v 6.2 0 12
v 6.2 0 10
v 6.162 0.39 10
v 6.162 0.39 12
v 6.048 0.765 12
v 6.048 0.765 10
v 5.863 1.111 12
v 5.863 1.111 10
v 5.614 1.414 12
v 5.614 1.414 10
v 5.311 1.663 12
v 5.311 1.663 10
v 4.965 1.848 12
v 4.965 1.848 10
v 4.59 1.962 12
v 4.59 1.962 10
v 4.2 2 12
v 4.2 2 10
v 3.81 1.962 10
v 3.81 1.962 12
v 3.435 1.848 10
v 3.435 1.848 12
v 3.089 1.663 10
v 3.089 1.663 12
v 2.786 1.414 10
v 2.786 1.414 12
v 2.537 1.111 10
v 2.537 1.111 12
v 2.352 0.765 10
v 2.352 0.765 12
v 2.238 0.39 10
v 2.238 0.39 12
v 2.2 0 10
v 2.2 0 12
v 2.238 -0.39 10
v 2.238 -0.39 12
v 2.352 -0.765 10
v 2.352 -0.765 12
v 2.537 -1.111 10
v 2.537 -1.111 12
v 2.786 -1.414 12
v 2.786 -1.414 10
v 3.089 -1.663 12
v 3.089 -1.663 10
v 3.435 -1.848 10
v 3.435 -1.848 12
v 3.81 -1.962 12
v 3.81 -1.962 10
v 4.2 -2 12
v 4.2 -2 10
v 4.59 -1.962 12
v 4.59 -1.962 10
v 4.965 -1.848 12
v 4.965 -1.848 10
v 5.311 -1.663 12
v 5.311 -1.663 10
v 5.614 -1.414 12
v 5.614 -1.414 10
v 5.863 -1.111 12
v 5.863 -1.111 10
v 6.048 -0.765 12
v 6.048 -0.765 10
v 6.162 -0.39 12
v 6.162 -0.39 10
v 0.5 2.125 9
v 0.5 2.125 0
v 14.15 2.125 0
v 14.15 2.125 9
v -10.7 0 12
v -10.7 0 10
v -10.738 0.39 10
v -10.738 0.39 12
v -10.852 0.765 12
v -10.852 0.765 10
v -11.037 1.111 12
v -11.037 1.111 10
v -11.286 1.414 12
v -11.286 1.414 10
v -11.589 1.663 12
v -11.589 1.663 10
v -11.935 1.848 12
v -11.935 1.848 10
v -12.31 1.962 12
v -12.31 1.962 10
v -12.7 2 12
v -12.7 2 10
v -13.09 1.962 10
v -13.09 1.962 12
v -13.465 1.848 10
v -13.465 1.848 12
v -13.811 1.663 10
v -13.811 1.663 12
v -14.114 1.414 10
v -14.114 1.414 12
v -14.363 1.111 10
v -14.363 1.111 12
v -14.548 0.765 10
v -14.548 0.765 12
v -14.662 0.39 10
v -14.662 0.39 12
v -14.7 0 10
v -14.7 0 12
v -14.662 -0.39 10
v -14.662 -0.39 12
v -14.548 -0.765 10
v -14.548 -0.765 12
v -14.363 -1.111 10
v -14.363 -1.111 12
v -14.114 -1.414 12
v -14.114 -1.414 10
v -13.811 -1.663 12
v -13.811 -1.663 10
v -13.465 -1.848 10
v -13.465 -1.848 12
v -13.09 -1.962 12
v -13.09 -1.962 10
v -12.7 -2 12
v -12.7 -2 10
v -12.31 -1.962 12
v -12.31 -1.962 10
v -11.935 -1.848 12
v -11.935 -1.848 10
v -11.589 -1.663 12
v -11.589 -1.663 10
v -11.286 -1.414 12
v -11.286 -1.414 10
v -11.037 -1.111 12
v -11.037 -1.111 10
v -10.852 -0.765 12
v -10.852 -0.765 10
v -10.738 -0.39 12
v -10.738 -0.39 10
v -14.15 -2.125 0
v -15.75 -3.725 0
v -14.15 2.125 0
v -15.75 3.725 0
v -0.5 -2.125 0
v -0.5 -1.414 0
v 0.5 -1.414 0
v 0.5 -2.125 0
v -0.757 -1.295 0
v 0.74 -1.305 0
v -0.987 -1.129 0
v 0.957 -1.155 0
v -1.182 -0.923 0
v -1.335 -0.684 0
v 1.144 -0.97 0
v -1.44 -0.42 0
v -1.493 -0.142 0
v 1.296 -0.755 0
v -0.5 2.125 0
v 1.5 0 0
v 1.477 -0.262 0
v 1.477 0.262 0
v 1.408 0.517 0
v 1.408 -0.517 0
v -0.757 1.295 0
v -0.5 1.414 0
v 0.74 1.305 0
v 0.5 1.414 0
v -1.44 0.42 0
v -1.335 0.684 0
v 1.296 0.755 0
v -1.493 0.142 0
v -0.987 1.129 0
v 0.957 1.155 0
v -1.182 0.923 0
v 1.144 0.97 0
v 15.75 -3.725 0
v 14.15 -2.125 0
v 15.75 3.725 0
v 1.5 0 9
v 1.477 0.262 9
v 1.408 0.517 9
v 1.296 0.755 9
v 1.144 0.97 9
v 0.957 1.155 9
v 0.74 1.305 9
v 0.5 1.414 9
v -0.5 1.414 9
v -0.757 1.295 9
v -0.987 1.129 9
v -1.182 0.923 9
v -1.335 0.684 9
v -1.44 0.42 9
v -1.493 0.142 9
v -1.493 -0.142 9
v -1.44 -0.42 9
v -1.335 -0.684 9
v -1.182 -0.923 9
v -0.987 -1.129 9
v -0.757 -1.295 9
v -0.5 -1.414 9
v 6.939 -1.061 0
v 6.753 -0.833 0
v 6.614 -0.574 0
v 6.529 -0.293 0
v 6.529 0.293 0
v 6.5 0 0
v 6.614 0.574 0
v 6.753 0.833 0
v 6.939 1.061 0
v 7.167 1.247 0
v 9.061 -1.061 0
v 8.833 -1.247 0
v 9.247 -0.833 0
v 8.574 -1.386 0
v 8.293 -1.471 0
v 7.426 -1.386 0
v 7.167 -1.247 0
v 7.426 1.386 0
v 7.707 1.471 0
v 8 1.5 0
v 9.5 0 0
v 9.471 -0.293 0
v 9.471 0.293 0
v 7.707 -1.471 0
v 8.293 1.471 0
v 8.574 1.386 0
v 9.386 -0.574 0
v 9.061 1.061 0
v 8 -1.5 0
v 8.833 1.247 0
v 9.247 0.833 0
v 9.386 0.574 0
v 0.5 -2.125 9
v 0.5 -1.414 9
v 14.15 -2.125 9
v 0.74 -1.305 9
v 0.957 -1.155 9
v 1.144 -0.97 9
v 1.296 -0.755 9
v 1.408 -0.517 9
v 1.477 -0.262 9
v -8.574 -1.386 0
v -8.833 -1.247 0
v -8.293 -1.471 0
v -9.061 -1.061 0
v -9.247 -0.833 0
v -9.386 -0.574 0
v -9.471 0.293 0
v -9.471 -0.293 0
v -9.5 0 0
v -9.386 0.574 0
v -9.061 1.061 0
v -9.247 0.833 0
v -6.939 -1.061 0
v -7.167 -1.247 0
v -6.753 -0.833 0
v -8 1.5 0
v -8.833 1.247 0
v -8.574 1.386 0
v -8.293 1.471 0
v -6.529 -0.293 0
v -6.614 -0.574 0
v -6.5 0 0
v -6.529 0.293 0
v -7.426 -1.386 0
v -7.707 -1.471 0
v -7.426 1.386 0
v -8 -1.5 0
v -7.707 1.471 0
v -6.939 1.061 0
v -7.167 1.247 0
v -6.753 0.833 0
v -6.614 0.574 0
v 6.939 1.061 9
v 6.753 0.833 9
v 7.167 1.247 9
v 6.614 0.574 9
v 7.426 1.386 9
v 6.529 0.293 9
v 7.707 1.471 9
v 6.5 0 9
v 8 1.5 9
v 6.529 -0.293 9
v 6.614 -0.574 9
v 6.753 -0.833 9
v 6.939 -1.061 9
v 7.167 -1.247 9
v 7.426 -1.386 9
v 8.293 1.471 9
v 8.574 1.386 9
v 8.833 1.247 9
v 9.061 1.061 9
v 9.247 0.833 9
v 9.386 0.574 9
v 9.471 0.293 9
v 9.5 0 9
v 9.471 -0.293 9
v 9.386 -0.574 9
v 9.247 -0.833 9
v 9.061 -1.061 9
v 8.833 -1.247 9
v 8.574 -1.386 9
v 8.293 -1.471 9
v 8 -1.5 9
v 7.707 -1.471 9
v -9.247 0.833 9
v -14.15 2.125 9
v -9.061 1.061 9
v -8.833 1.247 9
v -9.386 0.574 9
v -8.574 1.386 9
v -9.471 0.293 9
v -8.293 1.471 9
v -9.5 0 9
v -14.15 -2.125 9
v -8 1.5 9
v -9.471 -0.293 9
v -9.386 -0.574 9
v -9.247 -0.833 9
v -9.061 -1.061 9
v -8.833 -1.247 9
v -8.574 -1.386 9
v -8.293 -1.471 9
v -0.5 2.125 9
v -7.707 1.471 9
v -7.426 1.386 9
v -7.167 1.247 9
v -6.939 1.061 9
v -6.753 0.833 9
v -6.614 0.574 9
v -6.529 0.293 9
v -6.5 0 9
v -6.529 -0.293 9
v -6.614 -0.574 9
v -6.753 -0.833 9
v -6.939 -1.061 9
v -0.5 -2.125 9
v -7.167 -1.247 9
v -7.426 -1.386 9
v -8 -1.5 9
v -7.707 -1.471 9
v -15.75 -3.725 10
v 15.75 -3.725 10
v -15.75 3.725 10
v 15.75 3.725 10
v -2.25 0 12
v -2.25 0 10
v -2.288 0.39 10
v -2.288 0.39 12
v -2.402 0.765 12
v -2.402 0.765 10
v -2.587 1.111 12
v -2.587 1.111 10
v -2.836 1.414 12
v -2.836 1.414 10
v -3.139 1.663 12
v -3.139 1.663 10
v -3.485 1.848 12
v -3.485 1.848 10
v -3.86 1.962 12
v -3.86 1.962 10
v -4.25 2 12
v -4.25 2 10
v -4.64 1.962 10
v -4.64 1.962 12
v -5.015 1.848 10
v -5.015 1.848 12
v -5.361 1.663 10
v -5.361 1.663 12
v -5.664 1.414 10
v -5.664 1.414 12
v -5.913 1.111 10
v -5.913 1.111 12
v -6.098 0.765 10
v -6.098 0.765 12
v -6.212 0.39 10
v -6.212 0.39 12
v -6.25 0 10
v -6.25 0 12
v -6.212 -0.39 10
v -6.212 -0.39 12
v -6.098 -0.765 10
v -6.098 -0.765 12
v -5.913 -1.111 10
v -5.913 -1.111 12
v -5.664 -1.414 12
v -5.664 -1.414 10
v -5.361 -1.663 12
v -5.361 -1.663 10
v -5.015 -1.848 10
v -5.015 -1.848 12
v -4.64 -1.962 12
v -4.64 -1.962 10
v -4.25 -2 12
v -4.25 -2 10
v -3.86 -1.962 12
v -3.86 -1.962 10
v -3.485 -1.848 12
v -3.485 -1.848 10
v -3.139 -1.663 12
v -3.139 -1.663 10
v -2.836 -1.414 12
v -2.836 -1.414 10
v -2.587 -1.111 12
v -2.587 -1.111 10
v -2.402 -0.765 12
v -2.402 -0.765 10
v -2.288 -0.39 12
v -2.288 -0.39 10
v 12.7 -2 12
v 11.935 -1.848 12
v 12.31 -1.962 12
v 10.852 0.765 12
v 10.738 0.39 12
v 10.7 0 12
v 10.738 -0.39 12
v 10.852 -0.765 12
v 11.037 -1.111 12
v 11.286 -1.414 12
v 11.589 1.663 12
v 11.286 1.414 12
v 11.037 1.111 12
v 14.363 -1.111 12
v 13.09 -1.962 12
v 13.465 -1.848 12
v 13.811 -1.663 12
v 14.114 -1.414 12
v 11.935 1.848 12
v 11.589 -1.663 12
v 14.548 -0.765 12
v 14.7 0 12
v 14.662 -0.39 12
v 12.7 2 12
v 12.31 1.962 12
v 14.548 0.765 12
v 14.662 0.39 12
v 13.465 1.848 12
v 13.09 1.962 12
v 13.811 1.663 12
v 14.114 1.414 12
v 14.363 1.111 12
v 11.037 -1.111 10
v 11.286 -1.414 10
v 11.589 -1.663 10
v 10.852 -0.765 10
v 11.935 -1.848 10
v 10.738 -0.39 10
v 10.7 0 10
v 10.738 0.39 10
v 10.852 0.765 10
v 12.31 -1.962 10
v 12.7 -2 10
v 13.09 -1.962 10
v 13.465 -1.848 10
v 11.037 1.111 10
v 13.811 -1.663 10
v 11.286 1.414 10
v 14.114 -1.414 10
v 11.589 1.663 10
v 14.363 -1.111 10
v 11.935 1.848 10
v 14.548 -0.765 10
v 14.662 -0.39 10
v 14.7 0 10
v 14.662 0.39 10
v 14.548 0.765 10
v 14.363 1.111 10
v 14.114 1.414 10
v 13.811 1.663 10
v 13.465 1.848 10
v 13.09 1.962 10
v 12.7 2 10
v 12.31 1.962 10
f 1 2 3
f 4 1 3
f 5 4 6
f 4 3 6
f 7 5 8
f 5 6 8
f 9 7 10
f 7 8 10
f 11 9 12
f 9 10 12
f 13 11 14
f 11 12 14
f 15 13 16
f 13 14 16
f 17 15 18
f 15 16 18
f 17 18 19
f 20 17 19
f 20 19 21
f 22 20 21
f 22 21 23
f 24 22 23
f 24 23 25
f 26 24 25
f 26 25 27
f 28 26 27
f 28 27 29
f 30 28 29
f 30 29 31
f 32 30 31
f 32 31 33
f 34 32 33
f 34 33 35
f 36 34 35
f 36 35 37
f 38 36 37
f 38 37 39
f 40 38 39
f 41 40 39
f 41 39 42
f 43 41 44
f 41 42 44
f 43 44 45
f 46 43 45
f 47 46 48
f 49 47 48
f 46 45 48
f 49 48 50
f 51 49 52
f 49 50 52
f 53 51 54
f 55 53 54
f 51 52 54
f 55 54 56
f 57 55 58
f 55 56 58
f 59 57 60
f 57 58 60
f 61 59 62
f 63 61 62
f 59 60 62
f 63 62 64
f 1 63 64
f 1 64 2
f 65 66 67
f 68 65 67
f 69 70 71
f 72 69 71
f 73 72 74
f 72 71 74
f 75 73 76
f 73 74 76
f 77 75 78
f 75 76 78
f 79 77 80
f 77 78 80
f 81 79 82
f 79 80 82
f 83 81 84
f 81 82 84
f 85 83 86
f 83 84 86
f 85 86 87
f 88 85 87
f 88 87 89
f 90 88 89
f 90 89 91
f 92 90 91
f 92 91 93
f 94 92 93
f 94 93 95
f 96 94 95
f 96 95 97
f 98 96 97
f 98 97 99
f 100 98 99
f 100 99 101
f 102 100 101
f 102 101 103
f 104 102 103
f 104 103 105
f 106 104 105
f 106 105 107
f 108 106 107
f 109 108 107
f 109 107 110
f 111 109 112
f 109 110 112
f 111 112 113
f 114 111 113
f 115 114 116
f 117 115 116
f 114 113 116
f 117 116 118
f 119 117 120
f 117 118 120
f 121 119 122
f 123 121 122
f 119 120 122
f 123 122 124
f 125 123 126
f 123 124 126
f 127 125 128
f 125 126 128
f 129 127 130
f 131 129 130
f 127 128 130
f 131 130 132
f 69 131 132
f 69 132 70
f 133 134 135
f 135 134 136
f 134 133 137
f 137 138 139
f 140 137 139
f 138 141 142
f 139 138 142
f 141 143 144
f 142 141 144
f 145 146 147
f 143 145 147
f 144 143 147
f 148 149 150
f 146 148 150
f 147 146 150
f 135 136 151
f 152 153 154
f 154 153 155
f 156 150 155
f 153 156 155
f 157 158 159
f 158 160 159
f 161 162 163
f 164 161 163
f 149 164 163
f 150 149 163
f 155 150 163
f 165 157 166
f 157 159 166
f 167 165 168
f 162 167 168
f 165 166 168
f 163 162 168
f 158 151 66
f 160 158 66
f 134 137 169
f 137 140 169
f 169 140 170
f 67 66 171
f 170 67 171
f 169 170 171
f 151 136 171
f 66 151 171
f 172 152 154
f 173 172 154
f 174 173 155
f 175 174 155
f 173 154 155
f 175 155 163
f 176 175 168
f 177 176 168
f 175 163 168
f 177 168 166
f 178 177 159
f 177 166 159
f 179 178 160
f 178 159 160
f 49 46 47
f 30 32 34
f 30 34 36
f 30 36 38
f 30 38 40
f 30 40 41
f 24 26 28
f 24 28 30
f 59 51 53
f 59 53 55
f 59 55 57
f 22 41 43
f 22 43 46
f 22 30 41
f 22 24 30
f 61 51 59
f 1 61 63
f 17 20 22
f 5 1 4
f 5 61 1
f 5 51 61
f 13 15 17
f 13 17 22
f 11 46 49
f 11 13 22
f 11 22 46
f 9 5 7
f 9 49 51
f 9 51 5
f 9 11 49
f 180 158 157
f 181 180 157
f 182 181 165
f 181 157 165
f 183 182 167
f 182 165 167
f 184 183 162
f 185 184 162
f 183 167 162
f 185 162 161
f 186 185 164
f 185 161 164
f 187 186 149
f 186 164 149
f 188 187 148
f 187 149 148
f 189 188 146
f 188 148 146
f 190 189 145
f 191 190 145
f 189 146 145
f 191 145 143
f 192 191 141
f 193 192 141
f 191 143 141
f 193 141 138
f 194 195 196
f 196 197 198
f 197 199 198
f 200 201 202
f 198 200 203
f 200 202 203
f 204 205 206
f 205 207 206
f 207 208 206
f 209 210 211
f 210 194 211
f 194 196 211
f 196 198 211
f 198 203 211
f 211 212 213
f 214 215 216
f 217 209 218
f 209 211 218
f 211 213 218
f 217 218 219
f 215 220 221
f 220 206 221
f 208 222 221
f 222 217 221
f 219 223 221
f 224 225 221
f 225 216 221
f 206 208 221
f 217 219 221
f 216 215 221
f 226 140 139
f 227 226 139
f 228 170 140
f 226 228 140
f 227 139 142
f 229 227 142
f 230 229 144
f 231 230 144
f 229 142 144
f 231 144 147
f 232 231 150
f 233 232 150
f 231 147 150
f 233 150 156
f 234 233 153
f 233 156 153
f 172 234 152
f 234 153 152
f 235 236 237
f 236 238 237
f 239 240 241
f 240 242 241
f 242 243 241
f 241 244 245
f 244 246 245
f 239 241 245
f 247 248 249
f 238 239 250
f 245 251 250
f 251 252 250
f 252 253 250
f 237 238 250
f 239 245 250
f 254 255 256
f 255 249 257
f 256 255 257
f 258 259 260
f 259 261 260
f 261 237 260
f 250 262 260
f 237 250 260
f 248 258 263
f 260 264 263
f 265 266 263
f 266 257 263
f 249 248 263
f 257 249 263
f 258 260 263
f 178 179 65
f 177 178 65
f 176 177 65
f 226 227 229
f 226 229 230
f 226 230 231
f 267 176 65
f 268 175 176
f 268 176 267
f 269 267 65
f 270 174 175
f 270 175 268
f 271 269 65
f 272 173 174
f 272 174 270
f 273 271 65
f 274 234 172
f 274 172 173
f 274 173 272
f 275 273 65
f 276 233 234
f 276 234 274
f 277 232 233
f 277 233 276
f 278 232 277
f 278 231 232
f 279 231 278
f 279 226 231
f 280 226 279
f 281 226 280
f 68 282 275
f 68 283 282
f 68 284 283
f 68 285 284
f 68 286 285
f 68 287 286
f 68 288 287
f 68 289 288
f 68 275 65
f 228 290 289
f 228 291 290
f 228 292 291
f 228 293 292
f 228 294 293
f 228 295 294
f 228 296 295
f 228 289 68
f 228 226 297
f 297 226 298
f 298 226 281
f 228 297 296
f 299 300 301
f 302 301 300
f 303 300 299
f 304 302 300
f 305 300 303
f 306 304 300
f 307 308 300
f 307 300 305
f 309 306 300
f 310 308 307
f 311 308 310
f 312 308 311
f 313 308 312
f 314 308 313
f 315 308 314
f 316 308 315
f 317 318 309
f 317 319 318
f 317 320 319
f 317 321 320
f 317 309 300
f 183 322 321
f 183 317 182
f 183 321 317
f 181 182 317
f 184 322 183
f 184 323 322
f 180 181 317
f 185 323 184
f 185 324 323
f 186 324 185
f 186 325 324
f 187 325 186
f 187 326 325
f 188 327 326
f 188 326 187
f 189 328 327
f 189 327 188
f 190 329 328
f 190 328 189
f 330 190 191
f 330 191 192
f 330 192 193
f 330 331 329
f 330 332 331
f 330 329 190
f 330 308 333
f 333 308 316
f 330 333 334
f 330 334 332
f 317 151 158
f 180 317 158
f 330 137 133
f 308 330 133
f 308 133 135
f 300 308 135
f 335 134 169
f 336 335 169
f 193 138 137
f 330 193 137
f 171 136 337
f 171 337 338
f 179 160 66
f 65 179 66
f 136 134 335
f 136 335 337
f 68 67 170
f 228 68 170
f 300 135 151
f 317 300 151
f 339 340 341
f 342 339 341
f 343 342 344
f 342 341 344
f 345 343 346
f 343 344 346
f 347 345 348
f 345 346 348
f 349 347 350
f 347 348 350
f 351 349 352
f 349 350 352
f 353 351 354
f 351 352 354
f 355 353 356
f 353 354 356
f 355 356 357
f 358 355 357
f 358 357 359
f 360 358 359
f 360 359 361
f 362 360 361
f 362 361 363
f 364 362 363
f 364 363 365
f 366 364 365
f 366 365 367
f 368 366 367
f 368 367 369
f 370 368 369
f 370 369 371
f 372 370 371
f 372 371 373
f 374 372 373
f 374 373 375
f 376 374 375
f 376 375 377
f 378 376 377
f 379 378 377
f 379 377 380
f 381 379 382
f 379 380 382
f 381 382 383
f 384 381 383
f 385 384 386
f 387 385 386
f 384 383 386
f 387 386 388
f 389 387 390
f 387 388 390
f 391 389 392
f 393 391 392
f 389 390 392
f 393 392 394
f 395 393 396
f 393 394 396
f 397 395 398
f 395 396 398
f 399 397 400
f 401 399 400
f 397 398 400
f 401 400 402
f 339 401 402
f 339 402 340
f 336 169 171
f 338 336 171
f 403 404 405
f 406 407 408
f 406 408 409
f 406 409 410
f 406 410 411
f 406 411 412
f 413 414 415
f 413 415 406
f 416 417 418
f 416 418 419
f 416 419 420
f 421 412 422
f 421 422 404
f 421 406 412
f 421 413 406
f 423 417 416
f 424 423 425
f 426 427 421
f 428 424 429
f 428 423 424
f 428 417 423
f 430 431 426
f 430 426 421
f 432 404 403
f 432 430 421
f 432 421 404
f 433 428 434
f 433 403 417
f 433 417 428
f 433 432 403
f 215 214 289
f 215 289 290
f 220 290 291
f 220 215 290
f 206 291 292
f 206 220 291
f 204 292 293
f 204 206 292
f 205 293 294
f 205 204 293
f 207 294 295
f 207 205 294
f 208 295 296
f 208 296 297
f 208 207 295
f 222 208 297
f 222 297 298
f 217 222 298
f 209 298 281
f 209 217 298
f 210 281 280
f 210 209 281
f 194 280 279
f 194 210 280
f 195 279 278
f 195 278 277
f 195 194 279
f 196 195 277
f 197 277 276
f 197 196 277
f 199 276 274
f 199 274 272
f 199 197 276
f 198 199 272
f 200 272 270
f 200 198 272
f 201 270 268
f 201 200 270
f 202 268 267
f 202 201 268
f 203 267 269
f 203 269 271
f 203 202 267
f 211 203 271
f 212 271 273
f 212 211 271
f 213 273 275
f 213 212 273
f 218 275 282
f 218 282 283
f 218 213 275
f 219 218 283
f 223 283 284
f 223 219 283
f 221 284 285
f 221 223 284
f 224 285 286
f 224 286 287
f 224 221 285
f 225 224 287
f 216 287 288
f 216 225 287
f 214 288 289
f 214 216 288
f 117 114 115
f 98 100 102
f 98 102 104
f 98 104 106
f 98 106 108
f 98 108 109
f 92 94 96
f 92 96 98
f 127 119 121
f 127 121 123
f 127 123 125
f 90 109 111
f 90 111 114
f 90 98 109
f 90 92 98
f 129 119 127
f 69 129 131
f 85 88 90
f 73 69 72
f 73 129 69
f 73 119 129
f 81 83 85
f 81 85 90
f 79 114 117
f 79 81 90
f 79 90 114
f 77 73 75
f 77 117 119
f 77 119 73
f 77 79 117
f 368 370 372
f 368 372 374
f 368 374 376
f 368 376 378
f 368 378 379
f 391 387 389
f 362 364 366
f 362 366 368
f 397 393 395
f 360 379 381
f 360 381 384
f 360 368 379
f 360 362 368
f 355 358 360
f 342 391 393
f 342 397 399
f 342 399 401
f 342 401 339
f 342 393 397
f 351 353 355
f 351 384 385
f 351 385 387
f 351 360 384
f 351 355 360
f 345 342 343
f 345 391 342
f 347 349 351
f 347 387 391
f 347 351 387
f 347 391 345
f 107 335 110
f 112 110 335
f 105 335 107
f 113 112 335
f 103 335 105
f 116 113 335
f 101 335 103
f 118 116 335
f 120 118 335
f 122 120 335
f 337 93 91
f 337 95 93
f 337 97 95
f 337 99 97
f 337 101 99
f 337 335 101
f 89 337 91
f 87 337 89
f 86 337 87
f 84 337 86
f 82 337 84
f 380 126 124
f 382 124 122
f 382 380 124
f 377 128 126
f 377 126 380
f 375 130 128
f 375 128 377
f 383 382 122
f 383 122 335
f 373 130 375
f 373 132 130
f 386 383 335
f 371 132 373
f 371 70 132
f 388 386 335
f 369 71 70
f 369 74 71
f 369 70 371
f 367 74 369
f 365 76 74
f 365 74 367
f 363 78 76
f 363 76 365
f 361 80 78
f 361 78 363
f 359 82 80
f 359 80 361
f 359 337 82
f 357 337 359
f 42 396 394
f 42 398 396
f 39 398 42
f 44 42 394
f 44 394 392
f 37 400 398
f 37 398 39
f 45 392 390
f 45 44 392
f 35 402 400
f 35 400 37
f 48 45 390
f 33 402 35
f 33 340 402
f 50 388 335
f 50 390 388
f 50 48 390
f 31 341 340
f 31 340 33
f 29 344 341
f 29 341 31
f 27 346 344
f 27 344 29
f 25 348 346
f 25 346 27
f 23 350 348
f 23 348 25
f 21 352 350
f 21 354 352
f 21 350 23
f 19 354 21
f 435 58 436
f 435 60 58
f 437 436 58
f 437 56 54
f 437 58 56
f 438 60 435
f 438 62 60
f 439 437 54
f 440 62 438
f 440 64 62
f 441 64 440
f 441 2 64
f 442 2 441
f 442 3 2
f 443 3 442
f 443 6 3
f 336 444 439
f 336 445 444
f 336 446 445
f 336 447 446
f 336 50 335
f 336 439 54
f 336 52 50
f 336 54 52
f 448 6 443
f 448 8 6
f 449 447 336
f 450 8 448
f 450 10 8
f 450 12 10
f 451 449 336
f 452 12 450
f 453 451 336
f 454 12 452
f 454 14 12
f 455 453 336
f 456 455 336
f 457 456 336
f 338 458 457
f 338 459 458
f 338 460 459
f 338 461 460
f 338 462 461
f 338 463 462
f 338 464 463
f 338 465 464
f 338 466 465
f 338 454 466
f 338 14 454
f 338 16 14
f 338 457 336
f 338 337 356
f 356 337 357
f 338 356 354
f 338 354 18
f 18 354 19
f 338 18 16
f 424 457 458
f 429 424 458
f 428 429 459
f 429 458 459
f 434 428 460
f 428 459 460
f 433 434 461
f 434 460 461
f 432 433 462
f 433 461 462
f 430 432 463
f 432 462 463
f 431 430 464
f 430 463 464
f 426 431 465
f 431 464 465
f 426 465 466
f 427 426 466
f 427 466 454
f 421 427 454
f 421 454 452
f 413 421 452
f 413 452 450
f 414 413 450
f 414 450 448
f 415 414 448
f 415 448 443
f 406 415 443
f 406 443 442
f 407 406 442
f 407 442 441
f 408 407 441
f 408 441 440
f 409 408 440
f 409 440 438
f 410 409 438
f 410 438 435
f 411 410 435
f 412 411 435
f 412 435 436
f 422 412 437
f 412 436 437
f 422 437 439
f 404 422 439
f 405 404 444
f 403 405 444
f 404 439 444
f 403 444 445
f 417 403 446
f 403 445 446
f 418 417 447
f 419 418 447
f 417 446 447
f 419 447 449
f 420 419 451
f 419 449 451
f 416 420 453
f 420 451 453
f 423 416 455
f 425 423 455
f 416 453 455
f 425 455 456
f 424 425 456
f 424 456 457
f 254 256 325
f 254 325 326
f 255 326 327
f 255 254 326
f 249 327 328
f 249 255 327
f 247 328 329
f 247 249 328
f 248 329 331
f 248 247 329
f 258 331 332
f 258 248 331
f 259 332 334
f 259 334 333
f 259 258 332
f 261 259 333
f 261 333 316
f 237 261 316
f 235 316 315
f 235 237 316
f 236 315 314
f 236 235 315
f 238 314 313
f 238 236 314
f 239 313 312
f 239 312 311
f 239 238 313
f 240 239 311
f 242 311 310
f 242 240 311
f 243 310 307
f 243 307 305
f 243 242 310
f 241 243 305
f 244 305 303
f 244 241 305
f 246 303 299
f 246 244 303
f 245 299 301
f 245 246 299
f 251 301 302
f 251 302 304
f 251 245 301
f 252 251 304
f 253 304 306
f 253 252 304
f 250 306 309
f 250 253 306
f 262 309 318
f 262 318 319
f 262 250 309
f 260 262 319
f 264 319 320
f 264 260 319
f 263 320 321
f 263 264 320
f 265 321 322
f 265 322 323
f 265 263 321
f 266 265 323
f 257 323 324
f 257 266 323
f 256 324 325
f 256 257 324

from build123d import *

# Parameters (mm, degrees)
F0_W     = 31.5
F0_H     = 7.45
F0_R     = 2
F1_DEPTH = 10
F2_DEPTH = 12
F3_R     = 1.5
F4_DEPTH = 9


with BuildPart() as f1:
    # F0 (on Top) → F1 (new body)
    with BuildSketch(Plane.XY):
        Rectangle(F0_W, F0_H)
        with Locations((-12.7, 0)):
            Circle(F0_R, mode=Mode.SUBTRACT)
        with Locations((-4.25, 0)):
            Circle(F0_R, mode=Mode.SUBTRACT)
        with Locations((4.2, 0)):
            Circle(F0_R, mode=Mode.SUBTRACT)
        with Locations((12.7, 0)):
            Circle(F0_R, mode=Mode.SUBTRACT)
    extrude(amount=F1_DEPTH)

    # F0 (on Top) → F2 (join)
    with BuildSketch(Plane.XY):
        with Locations((-12.7, 0)):
            Circle(F0_R)
        with Locations((-4.25, 0)):
            Circle(F0_R)
        with Locations((4.2, 0)):
            Circle(F0_R)
        with Locations((12.7, 0)):
            Circle(F0_R)
    extrude(amount=F2_DEPTH)

    # F3 (on face) → F4 (cut)
    with BuildSketch(Plane(origin=(0, 0, 0), x_dir=(1, 0, 0), z_dir=(0, 0, -1))):
        with BuildLine():
            Line((14.15, -2.125), (14.15, 2.125))
            Line((14.15, 2.125), (0.5, 2.125))
            Line((0.5, 2.125), (0.5, 1.414214))
            ThreePointArc((0.5, 1.414214), (1.224745, 0.866025), (1.5, 0))
            ThreePointArc((1.5, 0), (1.224745, -0.866025), (0.5, -1.414214))
            Line((0.5, -1.414214), (0.5, -2.125))
            Line((0.5, -2.125), (14.15, -2.125))
        make_face()
        with Locations((8, 0)):
            Circle(F3_R, mode=Mode.SUBTRACT)
        with BuildLine():
            Line((-0.5, 1.414214), (-0.5, 2.125))
            Line((-0.5, 2.125), (-14.15, 2.125))
            Line((-14.15, 2.125), (-14.15, -2.125))
            Line((-14.15, -2.125), (-0.5, -2.125))
            Line((-0.5, -2.125), (-0.5, -1.414214))
            ThreePointArc((-0.5, -1.414214), (-1.5, 0), (-0.5, 1.414214))
        make_face()
        with Locations((-8, 0)):
            Circle(F3_R, mode=Mode.SUBTRACT)
    extrude(amount=-F4_DEPTH, mode=Mode.SUBTRACT)


solid = f1.part
